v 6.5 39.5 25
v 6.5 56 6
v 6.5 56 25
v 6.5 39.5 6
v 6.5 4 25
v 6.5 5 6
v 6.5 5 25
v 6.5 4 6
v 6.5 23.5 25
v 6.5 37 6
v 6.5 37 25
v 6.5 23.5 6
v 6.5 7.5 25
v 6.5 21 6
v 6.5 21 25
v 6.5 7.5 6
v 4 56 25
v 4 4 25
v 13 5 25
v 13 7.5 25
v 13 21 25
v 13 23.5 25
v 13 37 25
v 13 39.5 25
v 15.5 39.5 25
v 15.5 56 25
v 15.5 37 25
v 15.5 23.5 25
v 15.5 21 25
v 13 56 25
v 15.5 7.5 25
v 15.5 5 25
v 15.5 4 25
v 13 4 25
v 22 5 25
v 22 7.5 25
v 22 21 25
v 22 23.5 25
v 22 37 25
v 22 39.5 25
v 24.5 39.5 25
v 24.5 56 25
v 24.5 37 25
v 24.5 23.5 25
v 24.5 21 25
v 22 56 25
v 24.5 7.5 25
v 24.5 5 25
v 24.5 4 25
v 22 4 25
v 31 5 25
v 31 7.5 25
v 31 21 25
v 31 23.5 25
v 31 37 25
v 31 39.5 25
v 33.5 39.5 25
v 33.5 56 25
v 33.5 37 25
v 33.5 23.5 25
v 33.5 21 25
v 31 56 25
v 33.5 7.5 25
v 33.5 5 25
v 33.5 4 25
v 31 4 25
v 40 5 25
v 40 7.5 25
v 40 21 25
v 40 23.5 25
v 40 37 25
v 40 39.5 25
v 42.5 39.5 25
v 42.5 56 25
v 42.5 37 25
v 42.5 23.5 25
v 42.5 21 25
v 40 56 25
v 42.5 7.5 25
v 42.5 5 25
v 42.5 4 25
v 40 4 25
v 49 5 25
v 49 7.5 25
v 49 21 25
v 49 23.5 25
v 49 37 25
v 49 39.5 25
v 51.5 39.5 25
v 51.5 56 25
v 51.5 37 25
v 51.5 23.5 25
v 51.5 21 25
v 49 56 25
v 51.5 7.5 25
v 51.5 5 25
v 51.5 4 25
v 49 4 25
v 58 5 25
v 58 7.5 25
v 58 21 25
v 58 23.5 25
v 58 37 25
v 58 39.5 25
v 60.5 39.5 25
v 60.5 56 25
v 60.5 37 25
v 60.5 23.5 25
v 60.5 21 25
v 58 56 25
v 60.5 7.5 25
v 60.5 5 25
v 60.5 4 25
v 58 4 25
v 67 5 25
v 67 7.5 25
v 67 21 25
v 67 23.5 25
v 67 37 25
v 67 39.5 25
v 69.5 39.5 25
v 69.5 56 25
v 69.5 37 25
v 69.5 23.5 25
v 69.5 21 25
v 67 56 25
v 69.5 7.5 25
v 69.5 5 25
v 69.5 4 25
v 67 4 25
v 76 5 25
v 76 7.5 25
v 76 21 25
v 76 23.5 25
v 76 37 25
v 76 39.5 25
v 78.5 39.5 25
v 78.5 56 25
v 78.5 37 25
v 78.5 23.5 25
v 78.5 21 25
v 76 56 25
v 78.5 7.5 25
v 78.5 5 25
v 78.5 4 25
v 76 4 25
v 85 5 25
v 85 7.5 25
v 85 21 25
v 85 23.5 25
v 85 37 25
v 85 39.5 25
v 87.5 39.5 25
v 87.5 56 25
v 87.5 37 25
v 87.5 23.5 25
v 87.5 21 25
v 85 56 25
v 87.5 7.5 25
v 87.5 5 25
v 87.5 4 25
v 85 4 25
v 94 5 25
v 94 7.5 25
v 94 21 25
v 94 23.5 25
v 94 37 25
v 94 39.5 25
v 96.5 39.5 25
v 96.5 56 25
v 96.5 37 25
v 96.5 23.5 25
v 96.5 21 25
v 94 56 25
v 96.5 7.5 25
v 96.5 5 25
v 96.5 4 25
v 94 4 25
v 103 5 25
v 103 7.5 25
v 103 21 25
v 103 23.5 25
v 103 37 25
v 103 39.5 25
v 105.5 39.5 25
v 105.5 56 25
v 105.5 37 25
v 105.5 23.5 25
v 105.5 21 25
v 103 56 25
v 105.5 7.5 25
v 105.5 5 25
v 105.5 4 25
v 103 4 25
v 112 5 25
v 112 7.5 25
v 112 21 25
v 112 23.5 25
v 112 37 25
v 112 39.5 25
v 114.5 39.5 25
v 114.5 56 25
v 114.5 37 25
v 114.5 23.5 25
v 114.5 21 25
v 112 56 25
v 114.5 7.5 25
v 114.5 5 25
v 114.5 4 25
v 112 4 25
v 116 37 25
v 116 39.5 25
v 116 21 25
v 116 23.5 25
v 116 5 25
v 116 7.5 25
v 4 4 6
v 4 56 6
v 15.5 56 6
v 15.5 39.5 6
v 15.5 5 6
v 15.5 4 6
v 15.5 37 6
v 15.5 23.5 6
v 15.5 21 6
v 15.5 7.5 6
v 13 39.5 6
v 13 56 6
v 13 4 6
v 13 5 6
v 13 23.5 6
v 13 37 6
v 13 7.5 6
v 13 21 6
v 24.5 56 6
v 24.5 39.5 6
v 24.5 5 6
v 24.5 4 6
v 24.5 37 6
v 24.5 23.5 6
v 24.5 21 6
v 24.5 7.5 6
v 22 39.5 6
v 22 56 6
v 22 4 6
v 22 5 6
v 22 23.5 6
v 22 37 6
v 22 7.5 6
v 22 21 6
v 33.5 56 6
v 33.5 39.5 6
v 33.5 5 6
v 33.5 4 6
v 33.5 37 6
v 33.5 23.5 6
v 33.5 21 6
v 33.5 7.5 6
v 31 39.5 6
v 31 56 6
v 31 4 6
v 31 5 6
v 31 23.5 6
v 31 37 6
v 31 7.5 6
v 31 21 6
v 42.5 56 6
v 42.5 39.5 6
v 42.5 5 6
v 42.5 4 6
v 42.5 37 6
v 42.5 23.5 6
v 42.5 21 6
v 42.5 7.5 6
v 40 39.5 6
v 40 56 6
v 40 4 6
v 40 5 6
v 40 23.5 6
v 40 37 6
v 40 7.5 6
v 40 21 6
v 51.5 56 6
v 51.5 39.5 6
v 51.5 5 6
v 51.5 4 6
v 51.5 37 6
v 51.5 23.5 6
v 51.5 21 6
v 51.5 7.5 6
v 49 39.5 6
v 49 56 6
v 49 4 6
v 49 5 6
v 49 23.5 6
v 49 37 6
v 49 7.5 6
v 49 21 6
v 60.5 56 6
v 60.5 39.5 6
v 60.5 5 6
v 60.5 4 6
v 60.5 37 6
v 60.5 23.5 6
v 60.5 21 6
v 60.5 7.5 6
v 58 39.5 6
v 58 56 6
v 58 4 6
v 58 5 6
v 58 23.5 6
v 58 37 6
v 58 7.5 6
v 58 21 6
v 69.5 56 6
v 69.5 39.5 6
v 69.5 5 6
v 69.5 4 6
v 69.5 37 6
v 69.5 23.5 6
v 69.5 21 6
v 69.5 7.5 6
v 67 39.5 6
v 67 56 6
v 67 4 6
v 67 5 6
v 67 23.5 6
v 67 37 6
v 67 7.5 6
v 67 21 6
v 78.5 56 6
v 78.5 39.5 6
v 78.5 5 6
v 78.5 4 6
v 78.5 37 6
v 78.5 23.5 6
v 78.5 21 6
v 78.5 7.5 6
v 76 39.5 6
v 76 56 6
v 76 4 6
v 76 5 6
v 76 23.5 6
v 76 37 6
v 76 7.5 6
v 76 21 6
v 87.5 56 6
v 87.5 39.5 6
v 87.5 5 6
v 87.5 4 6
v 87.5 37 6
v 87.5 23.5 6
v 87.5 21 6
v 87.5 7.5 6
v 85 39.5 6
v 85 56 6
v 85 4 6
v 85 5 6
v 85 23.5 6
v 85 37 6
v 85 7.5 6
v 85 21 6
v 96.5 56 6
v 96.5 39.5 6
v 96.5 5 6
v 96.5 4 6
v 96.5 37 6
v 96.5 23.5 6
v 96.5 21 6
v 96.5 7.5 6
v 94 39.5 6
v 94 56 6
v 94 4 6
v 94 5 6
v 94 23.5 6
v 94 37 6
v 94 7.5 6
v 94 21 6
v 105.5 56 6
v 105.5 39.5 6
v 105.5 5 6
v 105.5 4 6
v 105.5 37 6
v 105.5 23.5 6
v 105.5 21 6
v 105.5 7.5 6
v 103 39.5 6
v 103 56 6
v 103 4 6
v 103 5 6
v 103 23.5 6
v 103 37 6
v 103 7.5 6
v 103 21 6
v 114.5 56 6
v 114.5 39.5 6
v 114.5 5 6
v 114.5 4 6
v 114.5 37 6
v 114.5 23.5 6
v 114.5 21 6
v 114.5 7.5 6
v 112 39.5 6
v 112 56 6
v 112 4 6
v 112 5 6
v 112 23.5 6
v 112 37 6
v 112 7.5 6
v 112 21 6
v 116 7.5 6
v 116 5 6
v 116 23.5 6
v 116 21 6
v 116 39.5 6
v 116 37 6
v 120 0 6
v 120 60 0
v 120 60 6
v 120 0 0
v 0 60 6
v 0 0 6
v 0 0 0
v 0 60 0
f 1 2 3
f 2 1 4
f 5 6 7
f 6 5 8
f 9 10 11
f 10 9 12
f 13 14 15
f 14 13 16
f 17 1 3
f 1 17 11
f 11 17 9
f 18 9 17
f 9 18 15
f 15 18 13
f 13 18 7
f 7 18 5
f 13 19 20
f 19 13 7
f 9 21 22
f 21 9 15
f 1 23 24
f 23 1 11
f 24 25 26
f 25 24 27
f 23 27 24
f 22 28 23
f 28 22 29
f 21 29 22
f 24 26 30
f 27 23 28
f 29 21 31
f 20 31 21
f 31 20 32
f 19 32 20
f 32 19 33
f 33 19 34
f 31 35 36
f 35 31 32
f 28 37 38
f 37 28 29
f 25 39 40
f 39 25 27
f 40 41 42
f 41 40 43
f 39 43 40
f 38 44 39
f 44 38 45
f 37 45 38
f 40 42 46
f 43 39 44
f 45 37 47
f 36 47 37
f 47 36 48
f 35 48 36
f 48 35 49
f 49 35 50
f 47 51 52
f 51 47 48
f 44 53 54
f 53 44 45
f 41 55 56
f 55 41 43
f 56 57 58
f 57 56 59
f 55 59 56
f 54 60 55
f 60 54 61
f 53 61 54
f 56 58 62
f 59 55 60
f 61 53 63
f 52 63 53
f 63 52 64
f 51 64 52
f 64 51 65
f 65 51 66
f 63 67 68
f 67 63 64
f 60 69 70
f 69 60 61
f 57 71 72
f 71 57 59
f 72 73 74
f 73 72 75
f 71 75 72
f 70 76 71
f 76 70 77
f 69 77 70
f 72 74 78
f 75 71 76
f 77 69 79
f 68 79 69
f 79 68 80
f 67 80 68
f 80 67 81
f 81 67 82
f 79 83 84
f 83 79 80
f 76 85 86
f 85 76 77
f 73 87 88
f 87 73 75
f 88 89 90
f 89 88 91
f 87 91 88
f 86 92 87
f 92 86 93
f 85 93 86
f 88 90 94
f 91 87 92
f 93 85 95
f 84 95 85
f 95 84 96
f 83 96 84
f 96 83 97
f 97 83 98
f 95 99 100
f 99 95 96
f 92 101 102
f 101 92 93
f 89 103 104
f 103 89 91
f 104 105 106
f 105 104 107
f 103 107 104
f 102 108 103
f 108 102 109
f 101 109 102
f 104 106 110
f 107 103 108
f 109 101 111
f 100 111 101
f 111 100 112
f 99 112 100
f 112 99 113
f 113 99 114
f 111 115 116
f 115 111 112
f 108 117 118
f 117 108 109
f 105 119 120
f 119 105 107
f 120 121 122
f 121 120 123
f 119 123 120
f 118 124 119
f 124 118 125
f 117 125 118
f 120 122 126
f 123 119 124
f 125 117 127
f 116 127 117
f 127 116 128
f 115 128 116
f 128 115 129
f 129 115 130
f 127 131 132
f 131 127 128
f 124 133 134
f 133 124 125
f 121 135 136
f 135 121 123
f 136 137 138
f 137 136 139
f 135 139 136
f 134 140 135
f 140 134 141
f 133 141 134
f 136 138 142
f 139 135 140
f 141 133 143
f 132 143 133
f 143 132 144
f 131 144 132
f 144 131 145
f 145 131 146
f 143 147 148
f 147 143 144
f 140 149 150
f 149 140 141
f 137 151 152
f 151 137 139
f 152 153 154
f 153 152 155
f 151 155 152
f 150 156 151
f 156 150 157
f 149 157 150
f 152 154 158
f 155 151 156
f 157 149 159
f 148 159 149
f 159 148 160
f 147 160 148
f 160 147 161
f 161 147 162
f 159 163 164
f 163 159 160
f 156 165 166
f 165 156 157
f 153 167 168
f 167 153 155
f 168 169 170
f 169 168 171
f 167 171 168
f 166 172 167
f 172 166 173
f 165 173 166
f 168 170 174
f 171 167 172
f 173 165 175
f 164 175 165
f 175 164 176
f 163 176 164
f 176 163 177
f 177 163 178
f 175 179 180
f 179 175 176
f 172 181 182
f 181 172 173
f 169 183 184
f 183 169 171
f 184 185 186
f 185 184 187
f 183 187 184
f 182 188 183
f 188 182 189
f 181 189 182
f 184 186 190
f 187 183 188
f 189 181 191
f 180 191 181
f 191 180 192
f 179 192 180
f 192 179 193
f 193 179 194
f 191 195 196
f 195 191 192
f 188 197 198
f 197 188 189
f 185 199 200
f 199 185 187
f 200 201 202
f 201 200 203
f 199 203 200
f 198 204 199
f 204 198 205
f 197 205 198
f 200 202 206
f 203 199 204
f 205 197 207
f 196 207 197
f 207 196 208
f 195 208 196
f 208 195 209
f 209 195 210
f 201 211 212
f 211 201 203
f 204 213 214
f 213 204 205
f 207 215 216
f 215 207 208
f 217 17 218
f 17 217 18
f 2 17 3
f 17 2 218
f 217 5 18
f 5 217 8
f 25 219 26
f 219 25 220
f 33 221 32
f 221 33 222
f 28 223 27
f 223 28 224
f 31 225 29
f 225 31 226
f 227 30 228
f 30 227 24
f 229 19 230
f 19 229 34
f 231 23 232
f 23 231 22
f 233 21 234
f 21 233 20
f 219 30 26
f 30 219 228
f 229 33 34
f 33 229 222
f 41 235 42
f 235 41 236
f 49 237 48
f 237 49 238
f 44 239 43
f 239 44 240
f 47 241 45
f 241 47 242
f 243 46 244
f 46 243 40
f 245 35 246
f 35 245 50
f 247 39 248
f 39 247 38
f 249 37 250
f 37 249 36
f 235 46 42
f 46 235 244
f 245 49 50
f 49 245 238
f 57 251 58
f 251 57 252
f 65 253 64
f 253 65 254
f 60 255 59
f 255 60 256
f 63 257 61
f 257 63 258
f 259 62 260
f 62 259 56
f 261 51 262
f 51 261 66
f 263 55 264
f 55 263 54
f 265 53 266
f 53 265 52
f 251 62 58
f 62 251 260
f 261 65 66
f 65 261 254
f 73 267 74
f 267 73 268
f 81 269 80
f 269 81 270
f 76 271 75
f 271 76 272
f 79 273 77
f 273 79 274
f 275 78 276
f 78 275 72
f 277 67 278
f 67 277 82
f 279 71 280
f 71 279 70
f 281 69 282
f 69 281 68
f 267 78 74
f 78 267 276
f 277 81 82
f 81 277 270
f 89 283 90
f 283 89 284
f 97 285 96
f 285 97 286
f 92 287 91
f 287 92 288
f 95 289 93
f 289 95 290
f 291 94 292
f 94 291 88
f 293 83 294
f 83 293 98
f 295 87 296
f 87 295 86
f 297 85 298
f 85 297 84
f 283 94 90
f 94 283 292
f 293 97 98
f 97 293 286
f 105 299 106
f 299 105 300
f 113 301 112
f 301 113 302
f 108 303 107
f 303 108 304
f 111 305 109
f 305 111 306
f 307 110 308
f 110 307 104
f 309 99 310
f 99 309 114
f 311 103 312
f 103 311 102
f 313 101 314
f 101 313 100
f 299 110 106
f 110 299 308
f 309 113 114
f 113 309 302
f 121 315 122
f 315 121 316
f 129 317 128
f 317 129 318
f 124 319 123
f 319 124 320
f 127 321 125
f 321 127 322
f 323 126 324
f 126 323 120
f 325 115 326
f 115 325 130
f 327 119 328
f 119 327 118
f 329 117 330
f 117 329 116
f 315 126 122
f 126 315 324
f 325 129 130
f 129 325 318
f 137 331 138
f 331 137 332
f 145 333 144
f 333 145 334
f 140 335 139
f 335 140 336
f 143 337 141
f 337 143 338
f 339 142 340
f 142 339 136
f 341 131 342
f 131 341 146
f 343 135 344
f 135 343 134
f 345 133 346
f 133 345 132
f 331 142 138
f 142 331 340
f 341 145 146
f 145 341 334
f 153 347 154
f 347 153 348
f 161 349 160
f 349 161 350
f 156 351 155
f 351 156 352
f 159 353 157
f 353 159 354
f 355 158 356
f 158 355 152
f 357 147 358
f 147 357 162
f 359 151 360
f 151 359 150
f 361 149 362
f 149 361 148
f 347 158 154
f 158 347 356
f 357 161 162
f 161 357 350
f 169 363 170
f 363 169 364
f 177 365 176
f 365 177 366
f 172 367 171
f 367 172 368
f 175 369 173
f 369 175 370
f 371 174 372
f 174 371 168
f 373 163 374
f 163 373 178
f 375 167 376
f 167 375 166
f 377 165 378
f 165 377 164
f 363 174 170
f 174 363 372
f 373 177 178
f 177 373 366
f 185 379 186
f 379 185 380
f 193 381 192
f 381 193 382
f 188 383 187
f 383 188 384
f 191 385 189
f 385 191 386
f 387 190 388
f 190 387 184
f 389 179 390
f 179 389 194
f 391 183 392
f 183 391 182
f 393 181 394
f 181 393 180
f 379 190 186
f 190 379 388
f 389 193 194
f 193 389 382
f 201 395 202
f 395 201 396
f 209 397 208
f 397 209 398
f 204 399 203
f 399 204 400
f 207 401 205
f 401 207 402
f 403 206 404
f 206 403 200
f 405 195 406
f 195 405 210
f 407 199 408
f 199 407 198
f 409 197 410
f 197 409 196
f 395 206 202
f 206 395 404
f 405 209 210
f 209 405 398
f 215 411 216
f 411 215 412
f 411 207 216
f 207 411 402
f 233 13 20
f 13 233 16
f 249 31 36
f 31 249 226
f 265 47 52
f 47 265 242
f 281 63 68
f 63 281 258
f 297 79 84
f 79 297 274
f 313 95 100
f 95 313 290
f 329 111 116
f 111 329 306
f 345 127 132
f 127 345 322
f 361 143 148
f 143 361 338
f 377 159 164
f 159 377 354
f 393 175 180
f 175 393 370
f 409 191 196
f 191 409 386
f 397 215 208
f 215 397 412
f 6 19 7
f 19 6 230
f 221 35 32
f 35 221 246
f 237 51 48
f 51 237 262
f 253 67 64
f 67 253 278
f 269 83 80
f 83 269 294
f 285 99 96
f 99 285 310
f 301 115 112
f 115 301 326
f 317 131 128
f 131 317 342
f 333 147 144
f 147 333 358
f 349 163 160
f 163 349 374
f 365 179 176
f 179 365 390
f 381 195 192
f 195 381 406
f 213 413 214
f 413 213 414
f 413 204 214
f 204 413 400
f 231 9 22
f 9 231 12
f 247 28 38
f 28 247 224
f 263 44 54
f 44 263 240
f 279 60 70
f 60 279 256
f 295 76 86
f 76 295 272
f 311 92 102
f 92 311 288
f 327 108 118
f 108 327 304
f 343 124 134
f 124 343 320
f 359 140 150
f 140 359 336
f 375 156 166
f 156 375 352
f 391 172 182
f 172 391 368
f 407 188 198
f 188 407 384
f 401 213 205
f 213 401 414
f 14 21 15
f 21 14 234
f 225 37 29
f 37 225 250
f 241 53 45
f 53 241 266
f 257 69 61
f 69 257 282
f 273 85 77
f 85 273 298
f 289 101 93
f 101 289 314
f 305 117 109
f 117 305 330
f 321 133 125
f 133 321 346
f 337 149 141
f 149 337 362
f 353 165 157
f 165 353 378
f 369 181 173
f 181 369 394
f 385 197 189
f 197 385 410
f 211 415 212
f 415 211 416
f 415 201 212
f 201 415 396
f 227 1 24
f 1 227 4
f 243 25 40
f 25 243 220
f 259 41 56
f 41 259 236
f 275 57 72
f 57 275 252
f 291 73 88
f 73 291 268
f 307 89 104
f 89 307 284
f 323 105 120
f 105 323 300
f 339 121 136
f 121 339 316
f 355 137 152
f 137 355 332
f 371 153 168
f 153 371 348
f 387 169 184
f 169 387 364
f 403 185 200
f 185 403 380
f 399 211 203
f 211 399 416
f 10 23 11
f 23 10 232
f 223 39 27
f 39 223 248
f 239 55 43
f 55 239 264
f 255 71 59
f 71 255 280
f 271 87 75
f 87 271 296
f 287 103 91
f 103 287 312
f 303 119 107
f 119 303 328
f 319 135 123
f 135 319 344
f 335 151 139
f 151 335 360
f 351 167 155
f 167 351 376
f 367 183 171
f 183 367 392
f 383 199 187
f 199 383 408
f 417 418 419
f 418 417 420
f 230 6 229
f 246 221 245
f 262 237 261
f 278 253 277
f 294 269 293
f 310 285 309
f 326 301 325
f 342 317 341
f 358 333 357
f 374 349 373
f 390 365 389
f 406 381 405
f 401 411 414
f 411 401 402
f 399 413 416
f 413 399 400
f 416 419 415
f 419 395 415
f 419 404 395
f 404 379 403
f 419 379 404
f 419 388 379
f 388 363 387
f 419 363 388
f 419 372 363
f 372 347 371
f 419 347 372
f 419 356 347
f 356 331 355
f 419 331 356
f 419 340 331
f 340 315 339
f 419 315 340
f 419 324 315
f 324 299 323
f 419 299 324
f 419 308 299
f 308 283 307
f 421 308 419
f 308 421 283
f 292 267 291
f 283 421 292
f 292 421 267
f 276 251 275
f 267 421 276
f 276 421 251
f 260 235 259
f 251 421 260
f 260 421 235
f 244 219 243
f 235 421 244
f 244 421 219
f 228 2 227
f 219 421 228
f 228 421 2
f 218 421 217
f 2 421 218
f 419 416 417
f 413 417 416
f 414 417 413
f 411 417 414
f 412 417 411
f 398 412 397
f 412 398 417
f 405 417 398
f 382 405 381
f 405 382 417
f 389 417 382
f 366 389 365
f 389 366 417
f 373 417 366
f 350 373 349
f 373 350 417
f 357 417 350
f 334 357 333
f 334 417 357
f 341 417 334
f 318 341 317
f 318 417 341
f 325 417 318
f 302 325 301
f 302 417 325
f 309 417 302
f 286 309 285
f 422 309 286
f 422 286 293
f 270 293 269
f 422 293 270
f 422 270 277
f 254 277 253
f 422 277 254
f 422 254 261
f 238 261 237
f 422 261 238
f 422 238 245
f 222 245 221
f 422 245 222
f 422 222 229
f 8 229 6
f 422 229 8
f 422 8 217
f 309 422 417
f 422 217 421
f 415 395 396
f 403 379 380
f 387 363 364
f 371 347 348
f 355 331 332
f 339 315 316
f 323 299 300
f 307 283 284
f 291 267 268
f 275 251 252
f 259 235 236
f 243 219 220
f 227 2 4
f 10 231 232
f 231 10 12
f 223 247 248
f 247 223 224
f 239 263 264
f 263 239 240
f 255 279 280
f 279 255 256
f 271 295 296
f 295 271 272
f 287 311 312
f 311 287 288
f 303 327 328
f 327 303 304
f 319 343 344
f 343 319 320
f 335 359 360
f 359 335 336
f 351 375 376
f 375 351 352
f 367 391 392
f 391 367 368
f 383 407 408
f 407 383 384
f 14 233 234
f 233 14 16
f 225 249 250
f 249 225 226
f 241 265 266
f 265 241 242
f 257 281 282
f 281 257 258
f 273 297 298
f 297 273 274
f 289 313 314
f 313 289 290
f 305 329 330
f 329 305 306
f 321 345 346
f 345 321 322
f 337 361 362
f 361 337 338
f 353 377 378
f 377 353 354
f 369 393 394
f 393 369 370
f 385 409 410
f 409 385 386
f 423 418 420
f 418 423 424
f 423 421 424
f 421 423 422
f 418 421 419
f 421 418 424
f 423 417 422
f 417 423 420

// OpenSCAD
$fn = 32;

// ----------------------------------------------------------------------
// Heatsink: cross fin block
// ----------------------------------------------------------------------

// --- parameters (mm) ---
base_l = 120;             // base length, X
base_w = 60;              // base width, Y
base_t = 6;               // base plate thickness
fin_h = 20;               // fin height above the base
fin_t = 2.5;              // fin thickness
edge = 4;                 // margin from the base ends
pitch = 9;                // fin pitch
rib_pitch = 16;           // cross rib pitch

n_fins = floor((base_l - 2 * edge - fin_t) / pitch) + 1;  // fin count
total_h = base_t + fin_h - 1;  // overall height
n_ribs = floor((base_w - 2 * edge) / rib_pitch);  // rib count

union() {
  cube([base_l, base_w, base_t]);
  for (i = [0 : n_fins - 1])
    translate([edge + i * pitch, edge, base_t - 1])
      cube([fin_t, base_w - 2 * edge, fin_h]);
  for (i = [0 : n_ribs - 1])
    translate([edge, edge + 1 + i * rib_pitch, base_t - 1])
      cube([base_l - 2 * edge, fin_t, fin_h]);
}
